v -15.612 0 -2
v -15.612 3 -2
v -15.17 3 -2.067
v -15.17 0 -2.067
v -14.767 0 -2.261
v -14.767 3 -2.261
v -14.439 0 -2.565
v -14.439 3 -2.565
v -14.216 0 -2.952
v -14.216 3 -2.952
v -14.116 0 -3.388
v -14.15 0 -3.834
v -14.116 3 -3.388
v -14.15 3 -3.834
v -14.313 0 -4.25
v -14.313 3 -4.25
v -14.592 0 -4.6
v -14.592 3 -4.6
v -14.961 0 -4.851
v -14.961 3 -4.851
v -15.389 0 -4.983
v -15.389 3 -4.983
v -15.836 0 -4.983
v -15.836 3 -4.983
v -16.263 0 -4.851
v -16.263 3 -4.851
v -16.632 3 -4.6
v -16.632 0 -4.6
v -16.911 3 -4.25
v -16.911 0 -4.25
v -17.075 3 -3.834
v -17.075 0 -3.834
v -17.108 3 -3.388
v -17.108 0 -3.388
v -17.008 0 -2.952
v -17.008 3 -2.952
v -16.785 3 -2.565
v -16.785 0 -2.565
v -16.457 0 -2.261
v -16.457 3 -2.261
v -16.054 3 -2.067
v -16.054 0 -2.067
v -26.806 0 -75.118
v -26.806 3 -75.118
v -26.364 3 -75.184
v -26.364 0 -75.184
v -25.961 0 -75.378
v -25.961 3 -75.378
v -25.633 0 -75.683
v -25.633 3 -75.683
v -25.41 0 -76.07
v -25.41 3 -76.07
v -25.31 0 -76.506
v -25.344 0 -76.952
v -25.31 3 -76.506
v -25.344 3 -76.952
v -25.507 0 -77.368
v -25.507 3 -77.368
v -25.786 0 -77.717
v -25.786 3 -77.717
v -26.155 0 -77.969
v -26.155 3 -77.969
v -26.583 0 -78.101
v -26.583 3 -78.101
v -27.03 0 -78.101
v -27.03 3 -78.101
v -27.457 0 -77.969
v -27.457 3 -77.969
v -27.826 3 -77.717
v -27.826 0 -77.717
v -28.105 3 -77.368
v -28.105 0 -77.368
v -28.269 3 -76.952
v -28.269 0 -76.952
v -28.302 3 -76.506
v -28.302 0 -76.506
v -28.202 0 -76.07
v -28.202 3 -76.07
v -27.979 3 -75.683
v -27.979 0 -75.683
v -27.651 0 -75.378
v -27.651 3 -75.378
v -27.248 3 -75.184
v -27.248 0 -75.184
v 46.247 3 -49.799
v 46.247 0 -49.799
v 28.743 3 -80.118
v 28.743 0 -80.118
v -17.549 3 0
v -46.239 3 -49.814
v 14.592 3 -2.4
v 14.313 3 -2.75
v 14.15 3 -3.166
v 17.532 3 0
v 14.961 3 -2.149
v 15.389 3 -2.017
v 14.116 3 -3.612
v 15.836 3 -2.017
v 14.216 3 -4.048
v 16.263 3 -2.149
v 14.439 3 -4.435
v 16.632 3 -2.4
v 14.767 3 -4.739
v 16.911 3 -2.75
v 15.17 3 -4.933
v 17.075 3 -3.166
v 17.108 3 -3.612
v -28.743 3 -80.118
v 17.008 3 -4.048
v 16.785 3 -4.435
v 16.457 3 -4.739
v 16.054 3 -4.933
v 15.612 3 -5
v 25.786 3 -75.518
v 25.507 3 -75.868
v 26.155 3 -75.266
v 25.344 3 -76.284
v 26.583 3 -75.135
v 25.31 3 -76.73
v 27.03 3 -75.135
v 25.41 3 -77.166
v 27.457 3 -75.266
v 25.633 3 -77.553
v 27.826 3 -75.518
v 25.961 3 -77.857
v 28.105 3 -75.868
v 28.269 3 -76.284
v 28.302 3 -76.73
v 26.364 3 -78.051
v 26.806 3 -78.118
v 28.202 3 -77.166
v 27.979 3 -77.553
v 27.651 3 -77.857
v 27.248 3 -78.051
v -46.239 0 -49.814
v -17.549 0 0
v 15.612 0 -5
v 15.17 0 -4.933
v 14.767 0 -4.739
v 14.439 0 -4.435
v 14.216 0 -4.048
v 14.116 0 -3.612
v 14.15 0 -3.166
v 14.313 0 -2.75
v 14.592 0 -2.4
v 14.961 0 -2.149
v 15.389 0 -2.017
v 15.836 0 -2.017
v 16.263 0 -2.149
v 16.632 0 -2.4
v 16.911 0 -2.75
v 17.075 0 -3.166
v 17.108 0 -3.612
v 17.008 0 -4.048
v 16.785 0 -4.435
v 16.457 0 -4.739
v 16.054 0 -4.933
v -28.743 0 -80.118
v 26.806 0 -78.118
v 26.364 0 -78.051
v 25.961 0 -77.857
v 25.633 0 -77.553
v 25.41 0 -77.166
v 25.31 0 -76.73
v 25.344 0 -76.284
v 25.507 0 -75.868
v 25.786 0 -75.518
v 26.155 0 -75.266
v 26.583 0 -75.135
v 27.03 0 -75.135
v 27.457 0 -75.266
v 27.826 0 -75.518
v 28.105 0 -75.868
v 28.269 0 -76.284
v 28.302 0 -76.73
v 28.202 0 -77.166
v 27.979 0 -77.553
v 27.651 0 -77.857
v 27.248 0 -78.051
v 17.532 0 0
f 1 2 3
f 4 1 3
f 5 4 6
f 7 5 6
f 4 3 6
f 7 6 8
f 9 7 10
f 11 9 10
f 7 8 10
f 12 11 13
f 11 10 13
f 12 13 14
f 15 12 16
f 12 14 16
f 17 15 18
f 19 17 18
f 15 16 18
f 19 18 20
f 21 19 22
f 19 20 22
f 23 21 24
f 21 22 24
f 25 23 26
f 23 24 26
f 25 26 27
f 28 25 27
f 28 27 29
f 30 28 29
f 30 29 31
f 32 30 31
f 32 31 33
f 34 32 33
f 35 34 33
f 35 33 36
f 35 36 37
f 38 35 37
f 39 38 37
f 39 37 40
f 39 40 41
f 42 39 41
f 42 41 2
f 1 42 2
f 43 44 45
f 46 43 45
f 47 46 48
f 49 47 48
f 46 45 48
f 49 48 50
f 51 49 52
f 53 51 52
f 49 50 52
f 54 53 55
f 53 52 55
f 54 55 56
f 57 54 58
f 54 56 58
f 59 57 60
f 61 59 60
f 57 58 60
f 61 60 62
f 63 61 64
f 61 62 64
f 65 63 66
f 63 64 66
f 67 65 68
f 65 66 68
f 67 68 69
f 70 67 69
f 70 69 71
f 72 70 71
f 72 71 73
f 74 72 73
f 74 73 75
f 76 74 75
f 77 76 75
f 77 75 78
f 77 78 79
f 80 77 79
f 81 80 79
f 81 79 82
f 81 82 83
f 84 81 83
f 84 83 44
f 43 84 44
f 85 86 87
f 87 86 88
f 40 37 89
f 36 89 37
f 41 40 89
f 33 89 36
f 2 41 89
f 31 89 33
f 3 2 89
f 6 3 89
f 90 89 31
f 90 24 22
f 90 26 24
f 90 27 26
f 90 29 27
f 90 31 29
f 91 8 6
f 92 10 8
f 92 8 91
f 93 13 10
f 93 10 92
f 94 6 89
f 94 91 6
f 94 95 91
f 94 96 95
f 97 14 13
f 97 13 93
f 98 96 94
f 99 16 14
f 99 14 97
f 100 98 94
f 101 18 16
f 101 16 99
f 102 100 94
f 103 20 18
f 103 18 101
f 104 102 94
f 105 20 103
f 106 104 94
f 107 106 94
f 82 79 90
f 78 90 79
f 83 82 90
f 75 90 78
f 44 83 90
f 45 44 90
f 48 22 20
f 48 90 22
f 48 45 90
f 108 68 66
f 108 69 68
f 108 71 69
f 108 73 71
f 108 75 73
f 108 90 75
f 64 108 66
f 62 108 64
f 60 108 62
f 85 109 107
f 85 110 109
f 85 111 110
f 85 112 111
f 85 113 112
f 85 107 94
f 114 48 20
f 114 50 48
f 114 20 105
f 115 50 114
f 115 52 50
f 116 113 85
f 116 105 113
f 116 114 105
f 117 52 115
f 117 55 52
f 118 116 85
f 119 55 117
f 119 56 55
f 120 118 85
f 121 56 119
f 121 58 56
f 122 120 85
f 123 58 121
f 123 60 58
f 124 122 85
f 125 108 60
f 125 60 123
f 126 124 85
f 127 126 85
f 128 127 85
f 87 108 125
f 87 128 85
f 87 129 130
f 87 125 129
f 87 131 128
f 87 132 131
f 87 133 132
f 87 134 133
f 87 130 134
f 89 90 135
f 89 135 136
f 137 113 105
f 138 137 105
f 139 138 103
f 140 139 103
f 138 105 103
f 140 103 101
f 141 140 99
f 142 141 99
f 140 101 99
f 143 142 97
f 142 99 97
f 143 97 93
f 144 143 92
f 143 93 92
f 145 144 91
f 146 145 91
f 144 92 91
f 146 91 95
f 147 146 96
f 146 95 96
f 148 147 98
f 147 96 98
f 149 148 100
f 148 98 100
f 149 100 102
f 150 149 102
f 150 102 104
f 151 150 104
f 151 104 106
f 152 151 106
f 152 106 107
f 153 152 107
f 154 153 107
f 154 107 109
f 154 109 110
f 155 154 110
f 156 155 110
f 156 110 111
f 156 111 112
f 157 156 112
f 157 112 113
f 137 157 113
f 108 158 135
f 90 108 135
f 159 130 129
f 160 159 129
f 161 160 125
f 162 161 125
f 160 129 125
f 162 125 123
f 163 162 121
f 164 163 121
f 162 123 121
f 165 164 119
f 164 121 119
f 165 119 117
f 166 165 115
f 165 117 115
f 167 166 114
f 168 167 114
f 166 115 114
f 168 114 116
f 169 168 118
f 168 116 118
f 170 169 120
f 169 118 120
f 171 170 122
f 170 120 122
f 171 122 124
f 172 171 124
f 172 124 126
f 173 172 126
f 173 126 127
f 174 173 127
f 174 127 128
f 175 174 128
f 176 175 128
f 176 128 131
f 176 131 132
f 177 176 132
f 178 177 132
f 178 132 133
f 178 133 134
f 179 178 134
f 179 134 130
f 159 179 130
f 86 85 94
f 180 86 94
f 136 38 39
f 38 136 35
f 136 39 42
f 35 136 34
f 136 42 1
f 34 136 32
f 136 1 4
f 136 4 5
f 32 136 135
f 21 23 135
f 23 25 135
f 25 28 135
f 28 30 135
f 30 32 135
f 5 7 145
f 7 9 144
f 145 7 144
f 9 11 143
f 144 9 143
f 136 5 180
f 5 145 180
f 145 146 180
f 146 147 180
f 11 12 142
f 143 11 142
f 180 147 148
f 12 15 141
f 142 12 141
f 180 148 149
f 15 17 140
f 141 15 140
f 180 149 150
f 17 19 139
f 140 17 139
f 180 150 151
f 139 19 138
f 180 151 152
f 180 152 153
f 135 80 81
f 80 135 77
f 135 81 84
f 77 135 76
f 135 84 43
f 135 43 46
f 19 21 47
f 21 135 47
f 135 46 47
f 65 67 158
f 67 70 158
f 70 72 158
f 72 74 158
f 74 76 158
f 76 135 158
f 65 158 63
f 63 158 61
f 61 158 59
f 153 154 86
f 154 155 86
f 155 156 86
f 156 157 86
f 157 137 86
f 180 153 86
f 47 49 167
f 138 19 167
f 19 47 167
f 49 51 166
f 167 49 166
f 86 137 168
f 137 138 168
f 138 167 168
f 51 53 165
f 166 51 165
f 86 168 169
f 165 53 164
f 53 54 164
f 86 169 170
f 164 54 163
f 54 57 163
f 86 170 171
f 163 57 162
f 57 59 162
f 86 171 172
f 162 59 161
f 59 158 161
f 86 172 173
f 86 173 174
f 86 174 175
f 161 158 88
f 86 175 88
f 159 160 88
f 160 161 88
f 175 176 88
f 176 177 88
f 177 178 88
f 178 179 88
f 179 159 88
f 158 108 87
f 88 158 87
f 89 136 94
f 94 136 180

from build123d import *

# Parameters (mm, degrees)
RESSALTO_EXTRUS_O1_DEPTH = 3
CORTE_EXTRUS_O2_DEPTH    = 151.026697624
ESBO_O5_R                = 1.5
CORTE_EXTRUS_O3_DEPTH    = 93.556406403


with BuildPart() as part:
    # Esboço1 → Ressalto-extrusão1 (new body)
    with BuildSketch(Plane(origin=(0, 0, 0), x_dir=(1, 0, 0), z_dir=(0, 1, 0))):
        Polygon((-75, 0), (75, 0), (0, 129.9), align=None)
    extrude(amount=RESSALTO_EXTRUS_O1_DEPTH)

    # Esboço4 → Corte-extrusão2 (cut, through all)
    with BuildSketch(Plane(origin=(0, 3, 0), x_dir=(1, 0, 0), z_dir=(0, 1, 0))):
        Polygon((-28.742601802, 80.117813679), (28.742601802, 80.117813679), (0, 129.9), align=None)
        Polygon((-46.239258354, 49.813604531), (-17.548607665, 0), (-75, 0), align=None)
        Polygon((17.532230415, 0), (75, 0), (46.247424766, 49.799460305), align=None)
    extrude(amount=-CORTE_EXTRUS_O2_DEPTH, mode=Mode.SUBTRACT)

    # Esboço5 → Corte-extrusão3 (cut, through all)
    with BuildSketch(Plane(origin=(0, 3, 0), x_dir=(1, 0, 0), z_dir=(0, 1, 0))):
        with Locations(Location((-26.806110129, 76.617813679, 0), (0, 0, 270))):
            Circle(ESBO_O5_R)
        with Locations(Location((26.806110129, 76.617813679, 0), (0, 0, 90))):
            Circle(ESBO_O5_R)
        with Locations(Location((-15.612115992, 3.5, 0), (0, 0, 270))):
            Circle(ESBO_O5_R)
        with Locations(Location((15.612115992, 3.5, 0), (0, 0, 90))):
            Circle(ESBO_O5_R)
    extrude(amount=-CORTE_EXTRUS_O3_DEPTH, mode=Mode.SUBTRACT)


solid = part.part
